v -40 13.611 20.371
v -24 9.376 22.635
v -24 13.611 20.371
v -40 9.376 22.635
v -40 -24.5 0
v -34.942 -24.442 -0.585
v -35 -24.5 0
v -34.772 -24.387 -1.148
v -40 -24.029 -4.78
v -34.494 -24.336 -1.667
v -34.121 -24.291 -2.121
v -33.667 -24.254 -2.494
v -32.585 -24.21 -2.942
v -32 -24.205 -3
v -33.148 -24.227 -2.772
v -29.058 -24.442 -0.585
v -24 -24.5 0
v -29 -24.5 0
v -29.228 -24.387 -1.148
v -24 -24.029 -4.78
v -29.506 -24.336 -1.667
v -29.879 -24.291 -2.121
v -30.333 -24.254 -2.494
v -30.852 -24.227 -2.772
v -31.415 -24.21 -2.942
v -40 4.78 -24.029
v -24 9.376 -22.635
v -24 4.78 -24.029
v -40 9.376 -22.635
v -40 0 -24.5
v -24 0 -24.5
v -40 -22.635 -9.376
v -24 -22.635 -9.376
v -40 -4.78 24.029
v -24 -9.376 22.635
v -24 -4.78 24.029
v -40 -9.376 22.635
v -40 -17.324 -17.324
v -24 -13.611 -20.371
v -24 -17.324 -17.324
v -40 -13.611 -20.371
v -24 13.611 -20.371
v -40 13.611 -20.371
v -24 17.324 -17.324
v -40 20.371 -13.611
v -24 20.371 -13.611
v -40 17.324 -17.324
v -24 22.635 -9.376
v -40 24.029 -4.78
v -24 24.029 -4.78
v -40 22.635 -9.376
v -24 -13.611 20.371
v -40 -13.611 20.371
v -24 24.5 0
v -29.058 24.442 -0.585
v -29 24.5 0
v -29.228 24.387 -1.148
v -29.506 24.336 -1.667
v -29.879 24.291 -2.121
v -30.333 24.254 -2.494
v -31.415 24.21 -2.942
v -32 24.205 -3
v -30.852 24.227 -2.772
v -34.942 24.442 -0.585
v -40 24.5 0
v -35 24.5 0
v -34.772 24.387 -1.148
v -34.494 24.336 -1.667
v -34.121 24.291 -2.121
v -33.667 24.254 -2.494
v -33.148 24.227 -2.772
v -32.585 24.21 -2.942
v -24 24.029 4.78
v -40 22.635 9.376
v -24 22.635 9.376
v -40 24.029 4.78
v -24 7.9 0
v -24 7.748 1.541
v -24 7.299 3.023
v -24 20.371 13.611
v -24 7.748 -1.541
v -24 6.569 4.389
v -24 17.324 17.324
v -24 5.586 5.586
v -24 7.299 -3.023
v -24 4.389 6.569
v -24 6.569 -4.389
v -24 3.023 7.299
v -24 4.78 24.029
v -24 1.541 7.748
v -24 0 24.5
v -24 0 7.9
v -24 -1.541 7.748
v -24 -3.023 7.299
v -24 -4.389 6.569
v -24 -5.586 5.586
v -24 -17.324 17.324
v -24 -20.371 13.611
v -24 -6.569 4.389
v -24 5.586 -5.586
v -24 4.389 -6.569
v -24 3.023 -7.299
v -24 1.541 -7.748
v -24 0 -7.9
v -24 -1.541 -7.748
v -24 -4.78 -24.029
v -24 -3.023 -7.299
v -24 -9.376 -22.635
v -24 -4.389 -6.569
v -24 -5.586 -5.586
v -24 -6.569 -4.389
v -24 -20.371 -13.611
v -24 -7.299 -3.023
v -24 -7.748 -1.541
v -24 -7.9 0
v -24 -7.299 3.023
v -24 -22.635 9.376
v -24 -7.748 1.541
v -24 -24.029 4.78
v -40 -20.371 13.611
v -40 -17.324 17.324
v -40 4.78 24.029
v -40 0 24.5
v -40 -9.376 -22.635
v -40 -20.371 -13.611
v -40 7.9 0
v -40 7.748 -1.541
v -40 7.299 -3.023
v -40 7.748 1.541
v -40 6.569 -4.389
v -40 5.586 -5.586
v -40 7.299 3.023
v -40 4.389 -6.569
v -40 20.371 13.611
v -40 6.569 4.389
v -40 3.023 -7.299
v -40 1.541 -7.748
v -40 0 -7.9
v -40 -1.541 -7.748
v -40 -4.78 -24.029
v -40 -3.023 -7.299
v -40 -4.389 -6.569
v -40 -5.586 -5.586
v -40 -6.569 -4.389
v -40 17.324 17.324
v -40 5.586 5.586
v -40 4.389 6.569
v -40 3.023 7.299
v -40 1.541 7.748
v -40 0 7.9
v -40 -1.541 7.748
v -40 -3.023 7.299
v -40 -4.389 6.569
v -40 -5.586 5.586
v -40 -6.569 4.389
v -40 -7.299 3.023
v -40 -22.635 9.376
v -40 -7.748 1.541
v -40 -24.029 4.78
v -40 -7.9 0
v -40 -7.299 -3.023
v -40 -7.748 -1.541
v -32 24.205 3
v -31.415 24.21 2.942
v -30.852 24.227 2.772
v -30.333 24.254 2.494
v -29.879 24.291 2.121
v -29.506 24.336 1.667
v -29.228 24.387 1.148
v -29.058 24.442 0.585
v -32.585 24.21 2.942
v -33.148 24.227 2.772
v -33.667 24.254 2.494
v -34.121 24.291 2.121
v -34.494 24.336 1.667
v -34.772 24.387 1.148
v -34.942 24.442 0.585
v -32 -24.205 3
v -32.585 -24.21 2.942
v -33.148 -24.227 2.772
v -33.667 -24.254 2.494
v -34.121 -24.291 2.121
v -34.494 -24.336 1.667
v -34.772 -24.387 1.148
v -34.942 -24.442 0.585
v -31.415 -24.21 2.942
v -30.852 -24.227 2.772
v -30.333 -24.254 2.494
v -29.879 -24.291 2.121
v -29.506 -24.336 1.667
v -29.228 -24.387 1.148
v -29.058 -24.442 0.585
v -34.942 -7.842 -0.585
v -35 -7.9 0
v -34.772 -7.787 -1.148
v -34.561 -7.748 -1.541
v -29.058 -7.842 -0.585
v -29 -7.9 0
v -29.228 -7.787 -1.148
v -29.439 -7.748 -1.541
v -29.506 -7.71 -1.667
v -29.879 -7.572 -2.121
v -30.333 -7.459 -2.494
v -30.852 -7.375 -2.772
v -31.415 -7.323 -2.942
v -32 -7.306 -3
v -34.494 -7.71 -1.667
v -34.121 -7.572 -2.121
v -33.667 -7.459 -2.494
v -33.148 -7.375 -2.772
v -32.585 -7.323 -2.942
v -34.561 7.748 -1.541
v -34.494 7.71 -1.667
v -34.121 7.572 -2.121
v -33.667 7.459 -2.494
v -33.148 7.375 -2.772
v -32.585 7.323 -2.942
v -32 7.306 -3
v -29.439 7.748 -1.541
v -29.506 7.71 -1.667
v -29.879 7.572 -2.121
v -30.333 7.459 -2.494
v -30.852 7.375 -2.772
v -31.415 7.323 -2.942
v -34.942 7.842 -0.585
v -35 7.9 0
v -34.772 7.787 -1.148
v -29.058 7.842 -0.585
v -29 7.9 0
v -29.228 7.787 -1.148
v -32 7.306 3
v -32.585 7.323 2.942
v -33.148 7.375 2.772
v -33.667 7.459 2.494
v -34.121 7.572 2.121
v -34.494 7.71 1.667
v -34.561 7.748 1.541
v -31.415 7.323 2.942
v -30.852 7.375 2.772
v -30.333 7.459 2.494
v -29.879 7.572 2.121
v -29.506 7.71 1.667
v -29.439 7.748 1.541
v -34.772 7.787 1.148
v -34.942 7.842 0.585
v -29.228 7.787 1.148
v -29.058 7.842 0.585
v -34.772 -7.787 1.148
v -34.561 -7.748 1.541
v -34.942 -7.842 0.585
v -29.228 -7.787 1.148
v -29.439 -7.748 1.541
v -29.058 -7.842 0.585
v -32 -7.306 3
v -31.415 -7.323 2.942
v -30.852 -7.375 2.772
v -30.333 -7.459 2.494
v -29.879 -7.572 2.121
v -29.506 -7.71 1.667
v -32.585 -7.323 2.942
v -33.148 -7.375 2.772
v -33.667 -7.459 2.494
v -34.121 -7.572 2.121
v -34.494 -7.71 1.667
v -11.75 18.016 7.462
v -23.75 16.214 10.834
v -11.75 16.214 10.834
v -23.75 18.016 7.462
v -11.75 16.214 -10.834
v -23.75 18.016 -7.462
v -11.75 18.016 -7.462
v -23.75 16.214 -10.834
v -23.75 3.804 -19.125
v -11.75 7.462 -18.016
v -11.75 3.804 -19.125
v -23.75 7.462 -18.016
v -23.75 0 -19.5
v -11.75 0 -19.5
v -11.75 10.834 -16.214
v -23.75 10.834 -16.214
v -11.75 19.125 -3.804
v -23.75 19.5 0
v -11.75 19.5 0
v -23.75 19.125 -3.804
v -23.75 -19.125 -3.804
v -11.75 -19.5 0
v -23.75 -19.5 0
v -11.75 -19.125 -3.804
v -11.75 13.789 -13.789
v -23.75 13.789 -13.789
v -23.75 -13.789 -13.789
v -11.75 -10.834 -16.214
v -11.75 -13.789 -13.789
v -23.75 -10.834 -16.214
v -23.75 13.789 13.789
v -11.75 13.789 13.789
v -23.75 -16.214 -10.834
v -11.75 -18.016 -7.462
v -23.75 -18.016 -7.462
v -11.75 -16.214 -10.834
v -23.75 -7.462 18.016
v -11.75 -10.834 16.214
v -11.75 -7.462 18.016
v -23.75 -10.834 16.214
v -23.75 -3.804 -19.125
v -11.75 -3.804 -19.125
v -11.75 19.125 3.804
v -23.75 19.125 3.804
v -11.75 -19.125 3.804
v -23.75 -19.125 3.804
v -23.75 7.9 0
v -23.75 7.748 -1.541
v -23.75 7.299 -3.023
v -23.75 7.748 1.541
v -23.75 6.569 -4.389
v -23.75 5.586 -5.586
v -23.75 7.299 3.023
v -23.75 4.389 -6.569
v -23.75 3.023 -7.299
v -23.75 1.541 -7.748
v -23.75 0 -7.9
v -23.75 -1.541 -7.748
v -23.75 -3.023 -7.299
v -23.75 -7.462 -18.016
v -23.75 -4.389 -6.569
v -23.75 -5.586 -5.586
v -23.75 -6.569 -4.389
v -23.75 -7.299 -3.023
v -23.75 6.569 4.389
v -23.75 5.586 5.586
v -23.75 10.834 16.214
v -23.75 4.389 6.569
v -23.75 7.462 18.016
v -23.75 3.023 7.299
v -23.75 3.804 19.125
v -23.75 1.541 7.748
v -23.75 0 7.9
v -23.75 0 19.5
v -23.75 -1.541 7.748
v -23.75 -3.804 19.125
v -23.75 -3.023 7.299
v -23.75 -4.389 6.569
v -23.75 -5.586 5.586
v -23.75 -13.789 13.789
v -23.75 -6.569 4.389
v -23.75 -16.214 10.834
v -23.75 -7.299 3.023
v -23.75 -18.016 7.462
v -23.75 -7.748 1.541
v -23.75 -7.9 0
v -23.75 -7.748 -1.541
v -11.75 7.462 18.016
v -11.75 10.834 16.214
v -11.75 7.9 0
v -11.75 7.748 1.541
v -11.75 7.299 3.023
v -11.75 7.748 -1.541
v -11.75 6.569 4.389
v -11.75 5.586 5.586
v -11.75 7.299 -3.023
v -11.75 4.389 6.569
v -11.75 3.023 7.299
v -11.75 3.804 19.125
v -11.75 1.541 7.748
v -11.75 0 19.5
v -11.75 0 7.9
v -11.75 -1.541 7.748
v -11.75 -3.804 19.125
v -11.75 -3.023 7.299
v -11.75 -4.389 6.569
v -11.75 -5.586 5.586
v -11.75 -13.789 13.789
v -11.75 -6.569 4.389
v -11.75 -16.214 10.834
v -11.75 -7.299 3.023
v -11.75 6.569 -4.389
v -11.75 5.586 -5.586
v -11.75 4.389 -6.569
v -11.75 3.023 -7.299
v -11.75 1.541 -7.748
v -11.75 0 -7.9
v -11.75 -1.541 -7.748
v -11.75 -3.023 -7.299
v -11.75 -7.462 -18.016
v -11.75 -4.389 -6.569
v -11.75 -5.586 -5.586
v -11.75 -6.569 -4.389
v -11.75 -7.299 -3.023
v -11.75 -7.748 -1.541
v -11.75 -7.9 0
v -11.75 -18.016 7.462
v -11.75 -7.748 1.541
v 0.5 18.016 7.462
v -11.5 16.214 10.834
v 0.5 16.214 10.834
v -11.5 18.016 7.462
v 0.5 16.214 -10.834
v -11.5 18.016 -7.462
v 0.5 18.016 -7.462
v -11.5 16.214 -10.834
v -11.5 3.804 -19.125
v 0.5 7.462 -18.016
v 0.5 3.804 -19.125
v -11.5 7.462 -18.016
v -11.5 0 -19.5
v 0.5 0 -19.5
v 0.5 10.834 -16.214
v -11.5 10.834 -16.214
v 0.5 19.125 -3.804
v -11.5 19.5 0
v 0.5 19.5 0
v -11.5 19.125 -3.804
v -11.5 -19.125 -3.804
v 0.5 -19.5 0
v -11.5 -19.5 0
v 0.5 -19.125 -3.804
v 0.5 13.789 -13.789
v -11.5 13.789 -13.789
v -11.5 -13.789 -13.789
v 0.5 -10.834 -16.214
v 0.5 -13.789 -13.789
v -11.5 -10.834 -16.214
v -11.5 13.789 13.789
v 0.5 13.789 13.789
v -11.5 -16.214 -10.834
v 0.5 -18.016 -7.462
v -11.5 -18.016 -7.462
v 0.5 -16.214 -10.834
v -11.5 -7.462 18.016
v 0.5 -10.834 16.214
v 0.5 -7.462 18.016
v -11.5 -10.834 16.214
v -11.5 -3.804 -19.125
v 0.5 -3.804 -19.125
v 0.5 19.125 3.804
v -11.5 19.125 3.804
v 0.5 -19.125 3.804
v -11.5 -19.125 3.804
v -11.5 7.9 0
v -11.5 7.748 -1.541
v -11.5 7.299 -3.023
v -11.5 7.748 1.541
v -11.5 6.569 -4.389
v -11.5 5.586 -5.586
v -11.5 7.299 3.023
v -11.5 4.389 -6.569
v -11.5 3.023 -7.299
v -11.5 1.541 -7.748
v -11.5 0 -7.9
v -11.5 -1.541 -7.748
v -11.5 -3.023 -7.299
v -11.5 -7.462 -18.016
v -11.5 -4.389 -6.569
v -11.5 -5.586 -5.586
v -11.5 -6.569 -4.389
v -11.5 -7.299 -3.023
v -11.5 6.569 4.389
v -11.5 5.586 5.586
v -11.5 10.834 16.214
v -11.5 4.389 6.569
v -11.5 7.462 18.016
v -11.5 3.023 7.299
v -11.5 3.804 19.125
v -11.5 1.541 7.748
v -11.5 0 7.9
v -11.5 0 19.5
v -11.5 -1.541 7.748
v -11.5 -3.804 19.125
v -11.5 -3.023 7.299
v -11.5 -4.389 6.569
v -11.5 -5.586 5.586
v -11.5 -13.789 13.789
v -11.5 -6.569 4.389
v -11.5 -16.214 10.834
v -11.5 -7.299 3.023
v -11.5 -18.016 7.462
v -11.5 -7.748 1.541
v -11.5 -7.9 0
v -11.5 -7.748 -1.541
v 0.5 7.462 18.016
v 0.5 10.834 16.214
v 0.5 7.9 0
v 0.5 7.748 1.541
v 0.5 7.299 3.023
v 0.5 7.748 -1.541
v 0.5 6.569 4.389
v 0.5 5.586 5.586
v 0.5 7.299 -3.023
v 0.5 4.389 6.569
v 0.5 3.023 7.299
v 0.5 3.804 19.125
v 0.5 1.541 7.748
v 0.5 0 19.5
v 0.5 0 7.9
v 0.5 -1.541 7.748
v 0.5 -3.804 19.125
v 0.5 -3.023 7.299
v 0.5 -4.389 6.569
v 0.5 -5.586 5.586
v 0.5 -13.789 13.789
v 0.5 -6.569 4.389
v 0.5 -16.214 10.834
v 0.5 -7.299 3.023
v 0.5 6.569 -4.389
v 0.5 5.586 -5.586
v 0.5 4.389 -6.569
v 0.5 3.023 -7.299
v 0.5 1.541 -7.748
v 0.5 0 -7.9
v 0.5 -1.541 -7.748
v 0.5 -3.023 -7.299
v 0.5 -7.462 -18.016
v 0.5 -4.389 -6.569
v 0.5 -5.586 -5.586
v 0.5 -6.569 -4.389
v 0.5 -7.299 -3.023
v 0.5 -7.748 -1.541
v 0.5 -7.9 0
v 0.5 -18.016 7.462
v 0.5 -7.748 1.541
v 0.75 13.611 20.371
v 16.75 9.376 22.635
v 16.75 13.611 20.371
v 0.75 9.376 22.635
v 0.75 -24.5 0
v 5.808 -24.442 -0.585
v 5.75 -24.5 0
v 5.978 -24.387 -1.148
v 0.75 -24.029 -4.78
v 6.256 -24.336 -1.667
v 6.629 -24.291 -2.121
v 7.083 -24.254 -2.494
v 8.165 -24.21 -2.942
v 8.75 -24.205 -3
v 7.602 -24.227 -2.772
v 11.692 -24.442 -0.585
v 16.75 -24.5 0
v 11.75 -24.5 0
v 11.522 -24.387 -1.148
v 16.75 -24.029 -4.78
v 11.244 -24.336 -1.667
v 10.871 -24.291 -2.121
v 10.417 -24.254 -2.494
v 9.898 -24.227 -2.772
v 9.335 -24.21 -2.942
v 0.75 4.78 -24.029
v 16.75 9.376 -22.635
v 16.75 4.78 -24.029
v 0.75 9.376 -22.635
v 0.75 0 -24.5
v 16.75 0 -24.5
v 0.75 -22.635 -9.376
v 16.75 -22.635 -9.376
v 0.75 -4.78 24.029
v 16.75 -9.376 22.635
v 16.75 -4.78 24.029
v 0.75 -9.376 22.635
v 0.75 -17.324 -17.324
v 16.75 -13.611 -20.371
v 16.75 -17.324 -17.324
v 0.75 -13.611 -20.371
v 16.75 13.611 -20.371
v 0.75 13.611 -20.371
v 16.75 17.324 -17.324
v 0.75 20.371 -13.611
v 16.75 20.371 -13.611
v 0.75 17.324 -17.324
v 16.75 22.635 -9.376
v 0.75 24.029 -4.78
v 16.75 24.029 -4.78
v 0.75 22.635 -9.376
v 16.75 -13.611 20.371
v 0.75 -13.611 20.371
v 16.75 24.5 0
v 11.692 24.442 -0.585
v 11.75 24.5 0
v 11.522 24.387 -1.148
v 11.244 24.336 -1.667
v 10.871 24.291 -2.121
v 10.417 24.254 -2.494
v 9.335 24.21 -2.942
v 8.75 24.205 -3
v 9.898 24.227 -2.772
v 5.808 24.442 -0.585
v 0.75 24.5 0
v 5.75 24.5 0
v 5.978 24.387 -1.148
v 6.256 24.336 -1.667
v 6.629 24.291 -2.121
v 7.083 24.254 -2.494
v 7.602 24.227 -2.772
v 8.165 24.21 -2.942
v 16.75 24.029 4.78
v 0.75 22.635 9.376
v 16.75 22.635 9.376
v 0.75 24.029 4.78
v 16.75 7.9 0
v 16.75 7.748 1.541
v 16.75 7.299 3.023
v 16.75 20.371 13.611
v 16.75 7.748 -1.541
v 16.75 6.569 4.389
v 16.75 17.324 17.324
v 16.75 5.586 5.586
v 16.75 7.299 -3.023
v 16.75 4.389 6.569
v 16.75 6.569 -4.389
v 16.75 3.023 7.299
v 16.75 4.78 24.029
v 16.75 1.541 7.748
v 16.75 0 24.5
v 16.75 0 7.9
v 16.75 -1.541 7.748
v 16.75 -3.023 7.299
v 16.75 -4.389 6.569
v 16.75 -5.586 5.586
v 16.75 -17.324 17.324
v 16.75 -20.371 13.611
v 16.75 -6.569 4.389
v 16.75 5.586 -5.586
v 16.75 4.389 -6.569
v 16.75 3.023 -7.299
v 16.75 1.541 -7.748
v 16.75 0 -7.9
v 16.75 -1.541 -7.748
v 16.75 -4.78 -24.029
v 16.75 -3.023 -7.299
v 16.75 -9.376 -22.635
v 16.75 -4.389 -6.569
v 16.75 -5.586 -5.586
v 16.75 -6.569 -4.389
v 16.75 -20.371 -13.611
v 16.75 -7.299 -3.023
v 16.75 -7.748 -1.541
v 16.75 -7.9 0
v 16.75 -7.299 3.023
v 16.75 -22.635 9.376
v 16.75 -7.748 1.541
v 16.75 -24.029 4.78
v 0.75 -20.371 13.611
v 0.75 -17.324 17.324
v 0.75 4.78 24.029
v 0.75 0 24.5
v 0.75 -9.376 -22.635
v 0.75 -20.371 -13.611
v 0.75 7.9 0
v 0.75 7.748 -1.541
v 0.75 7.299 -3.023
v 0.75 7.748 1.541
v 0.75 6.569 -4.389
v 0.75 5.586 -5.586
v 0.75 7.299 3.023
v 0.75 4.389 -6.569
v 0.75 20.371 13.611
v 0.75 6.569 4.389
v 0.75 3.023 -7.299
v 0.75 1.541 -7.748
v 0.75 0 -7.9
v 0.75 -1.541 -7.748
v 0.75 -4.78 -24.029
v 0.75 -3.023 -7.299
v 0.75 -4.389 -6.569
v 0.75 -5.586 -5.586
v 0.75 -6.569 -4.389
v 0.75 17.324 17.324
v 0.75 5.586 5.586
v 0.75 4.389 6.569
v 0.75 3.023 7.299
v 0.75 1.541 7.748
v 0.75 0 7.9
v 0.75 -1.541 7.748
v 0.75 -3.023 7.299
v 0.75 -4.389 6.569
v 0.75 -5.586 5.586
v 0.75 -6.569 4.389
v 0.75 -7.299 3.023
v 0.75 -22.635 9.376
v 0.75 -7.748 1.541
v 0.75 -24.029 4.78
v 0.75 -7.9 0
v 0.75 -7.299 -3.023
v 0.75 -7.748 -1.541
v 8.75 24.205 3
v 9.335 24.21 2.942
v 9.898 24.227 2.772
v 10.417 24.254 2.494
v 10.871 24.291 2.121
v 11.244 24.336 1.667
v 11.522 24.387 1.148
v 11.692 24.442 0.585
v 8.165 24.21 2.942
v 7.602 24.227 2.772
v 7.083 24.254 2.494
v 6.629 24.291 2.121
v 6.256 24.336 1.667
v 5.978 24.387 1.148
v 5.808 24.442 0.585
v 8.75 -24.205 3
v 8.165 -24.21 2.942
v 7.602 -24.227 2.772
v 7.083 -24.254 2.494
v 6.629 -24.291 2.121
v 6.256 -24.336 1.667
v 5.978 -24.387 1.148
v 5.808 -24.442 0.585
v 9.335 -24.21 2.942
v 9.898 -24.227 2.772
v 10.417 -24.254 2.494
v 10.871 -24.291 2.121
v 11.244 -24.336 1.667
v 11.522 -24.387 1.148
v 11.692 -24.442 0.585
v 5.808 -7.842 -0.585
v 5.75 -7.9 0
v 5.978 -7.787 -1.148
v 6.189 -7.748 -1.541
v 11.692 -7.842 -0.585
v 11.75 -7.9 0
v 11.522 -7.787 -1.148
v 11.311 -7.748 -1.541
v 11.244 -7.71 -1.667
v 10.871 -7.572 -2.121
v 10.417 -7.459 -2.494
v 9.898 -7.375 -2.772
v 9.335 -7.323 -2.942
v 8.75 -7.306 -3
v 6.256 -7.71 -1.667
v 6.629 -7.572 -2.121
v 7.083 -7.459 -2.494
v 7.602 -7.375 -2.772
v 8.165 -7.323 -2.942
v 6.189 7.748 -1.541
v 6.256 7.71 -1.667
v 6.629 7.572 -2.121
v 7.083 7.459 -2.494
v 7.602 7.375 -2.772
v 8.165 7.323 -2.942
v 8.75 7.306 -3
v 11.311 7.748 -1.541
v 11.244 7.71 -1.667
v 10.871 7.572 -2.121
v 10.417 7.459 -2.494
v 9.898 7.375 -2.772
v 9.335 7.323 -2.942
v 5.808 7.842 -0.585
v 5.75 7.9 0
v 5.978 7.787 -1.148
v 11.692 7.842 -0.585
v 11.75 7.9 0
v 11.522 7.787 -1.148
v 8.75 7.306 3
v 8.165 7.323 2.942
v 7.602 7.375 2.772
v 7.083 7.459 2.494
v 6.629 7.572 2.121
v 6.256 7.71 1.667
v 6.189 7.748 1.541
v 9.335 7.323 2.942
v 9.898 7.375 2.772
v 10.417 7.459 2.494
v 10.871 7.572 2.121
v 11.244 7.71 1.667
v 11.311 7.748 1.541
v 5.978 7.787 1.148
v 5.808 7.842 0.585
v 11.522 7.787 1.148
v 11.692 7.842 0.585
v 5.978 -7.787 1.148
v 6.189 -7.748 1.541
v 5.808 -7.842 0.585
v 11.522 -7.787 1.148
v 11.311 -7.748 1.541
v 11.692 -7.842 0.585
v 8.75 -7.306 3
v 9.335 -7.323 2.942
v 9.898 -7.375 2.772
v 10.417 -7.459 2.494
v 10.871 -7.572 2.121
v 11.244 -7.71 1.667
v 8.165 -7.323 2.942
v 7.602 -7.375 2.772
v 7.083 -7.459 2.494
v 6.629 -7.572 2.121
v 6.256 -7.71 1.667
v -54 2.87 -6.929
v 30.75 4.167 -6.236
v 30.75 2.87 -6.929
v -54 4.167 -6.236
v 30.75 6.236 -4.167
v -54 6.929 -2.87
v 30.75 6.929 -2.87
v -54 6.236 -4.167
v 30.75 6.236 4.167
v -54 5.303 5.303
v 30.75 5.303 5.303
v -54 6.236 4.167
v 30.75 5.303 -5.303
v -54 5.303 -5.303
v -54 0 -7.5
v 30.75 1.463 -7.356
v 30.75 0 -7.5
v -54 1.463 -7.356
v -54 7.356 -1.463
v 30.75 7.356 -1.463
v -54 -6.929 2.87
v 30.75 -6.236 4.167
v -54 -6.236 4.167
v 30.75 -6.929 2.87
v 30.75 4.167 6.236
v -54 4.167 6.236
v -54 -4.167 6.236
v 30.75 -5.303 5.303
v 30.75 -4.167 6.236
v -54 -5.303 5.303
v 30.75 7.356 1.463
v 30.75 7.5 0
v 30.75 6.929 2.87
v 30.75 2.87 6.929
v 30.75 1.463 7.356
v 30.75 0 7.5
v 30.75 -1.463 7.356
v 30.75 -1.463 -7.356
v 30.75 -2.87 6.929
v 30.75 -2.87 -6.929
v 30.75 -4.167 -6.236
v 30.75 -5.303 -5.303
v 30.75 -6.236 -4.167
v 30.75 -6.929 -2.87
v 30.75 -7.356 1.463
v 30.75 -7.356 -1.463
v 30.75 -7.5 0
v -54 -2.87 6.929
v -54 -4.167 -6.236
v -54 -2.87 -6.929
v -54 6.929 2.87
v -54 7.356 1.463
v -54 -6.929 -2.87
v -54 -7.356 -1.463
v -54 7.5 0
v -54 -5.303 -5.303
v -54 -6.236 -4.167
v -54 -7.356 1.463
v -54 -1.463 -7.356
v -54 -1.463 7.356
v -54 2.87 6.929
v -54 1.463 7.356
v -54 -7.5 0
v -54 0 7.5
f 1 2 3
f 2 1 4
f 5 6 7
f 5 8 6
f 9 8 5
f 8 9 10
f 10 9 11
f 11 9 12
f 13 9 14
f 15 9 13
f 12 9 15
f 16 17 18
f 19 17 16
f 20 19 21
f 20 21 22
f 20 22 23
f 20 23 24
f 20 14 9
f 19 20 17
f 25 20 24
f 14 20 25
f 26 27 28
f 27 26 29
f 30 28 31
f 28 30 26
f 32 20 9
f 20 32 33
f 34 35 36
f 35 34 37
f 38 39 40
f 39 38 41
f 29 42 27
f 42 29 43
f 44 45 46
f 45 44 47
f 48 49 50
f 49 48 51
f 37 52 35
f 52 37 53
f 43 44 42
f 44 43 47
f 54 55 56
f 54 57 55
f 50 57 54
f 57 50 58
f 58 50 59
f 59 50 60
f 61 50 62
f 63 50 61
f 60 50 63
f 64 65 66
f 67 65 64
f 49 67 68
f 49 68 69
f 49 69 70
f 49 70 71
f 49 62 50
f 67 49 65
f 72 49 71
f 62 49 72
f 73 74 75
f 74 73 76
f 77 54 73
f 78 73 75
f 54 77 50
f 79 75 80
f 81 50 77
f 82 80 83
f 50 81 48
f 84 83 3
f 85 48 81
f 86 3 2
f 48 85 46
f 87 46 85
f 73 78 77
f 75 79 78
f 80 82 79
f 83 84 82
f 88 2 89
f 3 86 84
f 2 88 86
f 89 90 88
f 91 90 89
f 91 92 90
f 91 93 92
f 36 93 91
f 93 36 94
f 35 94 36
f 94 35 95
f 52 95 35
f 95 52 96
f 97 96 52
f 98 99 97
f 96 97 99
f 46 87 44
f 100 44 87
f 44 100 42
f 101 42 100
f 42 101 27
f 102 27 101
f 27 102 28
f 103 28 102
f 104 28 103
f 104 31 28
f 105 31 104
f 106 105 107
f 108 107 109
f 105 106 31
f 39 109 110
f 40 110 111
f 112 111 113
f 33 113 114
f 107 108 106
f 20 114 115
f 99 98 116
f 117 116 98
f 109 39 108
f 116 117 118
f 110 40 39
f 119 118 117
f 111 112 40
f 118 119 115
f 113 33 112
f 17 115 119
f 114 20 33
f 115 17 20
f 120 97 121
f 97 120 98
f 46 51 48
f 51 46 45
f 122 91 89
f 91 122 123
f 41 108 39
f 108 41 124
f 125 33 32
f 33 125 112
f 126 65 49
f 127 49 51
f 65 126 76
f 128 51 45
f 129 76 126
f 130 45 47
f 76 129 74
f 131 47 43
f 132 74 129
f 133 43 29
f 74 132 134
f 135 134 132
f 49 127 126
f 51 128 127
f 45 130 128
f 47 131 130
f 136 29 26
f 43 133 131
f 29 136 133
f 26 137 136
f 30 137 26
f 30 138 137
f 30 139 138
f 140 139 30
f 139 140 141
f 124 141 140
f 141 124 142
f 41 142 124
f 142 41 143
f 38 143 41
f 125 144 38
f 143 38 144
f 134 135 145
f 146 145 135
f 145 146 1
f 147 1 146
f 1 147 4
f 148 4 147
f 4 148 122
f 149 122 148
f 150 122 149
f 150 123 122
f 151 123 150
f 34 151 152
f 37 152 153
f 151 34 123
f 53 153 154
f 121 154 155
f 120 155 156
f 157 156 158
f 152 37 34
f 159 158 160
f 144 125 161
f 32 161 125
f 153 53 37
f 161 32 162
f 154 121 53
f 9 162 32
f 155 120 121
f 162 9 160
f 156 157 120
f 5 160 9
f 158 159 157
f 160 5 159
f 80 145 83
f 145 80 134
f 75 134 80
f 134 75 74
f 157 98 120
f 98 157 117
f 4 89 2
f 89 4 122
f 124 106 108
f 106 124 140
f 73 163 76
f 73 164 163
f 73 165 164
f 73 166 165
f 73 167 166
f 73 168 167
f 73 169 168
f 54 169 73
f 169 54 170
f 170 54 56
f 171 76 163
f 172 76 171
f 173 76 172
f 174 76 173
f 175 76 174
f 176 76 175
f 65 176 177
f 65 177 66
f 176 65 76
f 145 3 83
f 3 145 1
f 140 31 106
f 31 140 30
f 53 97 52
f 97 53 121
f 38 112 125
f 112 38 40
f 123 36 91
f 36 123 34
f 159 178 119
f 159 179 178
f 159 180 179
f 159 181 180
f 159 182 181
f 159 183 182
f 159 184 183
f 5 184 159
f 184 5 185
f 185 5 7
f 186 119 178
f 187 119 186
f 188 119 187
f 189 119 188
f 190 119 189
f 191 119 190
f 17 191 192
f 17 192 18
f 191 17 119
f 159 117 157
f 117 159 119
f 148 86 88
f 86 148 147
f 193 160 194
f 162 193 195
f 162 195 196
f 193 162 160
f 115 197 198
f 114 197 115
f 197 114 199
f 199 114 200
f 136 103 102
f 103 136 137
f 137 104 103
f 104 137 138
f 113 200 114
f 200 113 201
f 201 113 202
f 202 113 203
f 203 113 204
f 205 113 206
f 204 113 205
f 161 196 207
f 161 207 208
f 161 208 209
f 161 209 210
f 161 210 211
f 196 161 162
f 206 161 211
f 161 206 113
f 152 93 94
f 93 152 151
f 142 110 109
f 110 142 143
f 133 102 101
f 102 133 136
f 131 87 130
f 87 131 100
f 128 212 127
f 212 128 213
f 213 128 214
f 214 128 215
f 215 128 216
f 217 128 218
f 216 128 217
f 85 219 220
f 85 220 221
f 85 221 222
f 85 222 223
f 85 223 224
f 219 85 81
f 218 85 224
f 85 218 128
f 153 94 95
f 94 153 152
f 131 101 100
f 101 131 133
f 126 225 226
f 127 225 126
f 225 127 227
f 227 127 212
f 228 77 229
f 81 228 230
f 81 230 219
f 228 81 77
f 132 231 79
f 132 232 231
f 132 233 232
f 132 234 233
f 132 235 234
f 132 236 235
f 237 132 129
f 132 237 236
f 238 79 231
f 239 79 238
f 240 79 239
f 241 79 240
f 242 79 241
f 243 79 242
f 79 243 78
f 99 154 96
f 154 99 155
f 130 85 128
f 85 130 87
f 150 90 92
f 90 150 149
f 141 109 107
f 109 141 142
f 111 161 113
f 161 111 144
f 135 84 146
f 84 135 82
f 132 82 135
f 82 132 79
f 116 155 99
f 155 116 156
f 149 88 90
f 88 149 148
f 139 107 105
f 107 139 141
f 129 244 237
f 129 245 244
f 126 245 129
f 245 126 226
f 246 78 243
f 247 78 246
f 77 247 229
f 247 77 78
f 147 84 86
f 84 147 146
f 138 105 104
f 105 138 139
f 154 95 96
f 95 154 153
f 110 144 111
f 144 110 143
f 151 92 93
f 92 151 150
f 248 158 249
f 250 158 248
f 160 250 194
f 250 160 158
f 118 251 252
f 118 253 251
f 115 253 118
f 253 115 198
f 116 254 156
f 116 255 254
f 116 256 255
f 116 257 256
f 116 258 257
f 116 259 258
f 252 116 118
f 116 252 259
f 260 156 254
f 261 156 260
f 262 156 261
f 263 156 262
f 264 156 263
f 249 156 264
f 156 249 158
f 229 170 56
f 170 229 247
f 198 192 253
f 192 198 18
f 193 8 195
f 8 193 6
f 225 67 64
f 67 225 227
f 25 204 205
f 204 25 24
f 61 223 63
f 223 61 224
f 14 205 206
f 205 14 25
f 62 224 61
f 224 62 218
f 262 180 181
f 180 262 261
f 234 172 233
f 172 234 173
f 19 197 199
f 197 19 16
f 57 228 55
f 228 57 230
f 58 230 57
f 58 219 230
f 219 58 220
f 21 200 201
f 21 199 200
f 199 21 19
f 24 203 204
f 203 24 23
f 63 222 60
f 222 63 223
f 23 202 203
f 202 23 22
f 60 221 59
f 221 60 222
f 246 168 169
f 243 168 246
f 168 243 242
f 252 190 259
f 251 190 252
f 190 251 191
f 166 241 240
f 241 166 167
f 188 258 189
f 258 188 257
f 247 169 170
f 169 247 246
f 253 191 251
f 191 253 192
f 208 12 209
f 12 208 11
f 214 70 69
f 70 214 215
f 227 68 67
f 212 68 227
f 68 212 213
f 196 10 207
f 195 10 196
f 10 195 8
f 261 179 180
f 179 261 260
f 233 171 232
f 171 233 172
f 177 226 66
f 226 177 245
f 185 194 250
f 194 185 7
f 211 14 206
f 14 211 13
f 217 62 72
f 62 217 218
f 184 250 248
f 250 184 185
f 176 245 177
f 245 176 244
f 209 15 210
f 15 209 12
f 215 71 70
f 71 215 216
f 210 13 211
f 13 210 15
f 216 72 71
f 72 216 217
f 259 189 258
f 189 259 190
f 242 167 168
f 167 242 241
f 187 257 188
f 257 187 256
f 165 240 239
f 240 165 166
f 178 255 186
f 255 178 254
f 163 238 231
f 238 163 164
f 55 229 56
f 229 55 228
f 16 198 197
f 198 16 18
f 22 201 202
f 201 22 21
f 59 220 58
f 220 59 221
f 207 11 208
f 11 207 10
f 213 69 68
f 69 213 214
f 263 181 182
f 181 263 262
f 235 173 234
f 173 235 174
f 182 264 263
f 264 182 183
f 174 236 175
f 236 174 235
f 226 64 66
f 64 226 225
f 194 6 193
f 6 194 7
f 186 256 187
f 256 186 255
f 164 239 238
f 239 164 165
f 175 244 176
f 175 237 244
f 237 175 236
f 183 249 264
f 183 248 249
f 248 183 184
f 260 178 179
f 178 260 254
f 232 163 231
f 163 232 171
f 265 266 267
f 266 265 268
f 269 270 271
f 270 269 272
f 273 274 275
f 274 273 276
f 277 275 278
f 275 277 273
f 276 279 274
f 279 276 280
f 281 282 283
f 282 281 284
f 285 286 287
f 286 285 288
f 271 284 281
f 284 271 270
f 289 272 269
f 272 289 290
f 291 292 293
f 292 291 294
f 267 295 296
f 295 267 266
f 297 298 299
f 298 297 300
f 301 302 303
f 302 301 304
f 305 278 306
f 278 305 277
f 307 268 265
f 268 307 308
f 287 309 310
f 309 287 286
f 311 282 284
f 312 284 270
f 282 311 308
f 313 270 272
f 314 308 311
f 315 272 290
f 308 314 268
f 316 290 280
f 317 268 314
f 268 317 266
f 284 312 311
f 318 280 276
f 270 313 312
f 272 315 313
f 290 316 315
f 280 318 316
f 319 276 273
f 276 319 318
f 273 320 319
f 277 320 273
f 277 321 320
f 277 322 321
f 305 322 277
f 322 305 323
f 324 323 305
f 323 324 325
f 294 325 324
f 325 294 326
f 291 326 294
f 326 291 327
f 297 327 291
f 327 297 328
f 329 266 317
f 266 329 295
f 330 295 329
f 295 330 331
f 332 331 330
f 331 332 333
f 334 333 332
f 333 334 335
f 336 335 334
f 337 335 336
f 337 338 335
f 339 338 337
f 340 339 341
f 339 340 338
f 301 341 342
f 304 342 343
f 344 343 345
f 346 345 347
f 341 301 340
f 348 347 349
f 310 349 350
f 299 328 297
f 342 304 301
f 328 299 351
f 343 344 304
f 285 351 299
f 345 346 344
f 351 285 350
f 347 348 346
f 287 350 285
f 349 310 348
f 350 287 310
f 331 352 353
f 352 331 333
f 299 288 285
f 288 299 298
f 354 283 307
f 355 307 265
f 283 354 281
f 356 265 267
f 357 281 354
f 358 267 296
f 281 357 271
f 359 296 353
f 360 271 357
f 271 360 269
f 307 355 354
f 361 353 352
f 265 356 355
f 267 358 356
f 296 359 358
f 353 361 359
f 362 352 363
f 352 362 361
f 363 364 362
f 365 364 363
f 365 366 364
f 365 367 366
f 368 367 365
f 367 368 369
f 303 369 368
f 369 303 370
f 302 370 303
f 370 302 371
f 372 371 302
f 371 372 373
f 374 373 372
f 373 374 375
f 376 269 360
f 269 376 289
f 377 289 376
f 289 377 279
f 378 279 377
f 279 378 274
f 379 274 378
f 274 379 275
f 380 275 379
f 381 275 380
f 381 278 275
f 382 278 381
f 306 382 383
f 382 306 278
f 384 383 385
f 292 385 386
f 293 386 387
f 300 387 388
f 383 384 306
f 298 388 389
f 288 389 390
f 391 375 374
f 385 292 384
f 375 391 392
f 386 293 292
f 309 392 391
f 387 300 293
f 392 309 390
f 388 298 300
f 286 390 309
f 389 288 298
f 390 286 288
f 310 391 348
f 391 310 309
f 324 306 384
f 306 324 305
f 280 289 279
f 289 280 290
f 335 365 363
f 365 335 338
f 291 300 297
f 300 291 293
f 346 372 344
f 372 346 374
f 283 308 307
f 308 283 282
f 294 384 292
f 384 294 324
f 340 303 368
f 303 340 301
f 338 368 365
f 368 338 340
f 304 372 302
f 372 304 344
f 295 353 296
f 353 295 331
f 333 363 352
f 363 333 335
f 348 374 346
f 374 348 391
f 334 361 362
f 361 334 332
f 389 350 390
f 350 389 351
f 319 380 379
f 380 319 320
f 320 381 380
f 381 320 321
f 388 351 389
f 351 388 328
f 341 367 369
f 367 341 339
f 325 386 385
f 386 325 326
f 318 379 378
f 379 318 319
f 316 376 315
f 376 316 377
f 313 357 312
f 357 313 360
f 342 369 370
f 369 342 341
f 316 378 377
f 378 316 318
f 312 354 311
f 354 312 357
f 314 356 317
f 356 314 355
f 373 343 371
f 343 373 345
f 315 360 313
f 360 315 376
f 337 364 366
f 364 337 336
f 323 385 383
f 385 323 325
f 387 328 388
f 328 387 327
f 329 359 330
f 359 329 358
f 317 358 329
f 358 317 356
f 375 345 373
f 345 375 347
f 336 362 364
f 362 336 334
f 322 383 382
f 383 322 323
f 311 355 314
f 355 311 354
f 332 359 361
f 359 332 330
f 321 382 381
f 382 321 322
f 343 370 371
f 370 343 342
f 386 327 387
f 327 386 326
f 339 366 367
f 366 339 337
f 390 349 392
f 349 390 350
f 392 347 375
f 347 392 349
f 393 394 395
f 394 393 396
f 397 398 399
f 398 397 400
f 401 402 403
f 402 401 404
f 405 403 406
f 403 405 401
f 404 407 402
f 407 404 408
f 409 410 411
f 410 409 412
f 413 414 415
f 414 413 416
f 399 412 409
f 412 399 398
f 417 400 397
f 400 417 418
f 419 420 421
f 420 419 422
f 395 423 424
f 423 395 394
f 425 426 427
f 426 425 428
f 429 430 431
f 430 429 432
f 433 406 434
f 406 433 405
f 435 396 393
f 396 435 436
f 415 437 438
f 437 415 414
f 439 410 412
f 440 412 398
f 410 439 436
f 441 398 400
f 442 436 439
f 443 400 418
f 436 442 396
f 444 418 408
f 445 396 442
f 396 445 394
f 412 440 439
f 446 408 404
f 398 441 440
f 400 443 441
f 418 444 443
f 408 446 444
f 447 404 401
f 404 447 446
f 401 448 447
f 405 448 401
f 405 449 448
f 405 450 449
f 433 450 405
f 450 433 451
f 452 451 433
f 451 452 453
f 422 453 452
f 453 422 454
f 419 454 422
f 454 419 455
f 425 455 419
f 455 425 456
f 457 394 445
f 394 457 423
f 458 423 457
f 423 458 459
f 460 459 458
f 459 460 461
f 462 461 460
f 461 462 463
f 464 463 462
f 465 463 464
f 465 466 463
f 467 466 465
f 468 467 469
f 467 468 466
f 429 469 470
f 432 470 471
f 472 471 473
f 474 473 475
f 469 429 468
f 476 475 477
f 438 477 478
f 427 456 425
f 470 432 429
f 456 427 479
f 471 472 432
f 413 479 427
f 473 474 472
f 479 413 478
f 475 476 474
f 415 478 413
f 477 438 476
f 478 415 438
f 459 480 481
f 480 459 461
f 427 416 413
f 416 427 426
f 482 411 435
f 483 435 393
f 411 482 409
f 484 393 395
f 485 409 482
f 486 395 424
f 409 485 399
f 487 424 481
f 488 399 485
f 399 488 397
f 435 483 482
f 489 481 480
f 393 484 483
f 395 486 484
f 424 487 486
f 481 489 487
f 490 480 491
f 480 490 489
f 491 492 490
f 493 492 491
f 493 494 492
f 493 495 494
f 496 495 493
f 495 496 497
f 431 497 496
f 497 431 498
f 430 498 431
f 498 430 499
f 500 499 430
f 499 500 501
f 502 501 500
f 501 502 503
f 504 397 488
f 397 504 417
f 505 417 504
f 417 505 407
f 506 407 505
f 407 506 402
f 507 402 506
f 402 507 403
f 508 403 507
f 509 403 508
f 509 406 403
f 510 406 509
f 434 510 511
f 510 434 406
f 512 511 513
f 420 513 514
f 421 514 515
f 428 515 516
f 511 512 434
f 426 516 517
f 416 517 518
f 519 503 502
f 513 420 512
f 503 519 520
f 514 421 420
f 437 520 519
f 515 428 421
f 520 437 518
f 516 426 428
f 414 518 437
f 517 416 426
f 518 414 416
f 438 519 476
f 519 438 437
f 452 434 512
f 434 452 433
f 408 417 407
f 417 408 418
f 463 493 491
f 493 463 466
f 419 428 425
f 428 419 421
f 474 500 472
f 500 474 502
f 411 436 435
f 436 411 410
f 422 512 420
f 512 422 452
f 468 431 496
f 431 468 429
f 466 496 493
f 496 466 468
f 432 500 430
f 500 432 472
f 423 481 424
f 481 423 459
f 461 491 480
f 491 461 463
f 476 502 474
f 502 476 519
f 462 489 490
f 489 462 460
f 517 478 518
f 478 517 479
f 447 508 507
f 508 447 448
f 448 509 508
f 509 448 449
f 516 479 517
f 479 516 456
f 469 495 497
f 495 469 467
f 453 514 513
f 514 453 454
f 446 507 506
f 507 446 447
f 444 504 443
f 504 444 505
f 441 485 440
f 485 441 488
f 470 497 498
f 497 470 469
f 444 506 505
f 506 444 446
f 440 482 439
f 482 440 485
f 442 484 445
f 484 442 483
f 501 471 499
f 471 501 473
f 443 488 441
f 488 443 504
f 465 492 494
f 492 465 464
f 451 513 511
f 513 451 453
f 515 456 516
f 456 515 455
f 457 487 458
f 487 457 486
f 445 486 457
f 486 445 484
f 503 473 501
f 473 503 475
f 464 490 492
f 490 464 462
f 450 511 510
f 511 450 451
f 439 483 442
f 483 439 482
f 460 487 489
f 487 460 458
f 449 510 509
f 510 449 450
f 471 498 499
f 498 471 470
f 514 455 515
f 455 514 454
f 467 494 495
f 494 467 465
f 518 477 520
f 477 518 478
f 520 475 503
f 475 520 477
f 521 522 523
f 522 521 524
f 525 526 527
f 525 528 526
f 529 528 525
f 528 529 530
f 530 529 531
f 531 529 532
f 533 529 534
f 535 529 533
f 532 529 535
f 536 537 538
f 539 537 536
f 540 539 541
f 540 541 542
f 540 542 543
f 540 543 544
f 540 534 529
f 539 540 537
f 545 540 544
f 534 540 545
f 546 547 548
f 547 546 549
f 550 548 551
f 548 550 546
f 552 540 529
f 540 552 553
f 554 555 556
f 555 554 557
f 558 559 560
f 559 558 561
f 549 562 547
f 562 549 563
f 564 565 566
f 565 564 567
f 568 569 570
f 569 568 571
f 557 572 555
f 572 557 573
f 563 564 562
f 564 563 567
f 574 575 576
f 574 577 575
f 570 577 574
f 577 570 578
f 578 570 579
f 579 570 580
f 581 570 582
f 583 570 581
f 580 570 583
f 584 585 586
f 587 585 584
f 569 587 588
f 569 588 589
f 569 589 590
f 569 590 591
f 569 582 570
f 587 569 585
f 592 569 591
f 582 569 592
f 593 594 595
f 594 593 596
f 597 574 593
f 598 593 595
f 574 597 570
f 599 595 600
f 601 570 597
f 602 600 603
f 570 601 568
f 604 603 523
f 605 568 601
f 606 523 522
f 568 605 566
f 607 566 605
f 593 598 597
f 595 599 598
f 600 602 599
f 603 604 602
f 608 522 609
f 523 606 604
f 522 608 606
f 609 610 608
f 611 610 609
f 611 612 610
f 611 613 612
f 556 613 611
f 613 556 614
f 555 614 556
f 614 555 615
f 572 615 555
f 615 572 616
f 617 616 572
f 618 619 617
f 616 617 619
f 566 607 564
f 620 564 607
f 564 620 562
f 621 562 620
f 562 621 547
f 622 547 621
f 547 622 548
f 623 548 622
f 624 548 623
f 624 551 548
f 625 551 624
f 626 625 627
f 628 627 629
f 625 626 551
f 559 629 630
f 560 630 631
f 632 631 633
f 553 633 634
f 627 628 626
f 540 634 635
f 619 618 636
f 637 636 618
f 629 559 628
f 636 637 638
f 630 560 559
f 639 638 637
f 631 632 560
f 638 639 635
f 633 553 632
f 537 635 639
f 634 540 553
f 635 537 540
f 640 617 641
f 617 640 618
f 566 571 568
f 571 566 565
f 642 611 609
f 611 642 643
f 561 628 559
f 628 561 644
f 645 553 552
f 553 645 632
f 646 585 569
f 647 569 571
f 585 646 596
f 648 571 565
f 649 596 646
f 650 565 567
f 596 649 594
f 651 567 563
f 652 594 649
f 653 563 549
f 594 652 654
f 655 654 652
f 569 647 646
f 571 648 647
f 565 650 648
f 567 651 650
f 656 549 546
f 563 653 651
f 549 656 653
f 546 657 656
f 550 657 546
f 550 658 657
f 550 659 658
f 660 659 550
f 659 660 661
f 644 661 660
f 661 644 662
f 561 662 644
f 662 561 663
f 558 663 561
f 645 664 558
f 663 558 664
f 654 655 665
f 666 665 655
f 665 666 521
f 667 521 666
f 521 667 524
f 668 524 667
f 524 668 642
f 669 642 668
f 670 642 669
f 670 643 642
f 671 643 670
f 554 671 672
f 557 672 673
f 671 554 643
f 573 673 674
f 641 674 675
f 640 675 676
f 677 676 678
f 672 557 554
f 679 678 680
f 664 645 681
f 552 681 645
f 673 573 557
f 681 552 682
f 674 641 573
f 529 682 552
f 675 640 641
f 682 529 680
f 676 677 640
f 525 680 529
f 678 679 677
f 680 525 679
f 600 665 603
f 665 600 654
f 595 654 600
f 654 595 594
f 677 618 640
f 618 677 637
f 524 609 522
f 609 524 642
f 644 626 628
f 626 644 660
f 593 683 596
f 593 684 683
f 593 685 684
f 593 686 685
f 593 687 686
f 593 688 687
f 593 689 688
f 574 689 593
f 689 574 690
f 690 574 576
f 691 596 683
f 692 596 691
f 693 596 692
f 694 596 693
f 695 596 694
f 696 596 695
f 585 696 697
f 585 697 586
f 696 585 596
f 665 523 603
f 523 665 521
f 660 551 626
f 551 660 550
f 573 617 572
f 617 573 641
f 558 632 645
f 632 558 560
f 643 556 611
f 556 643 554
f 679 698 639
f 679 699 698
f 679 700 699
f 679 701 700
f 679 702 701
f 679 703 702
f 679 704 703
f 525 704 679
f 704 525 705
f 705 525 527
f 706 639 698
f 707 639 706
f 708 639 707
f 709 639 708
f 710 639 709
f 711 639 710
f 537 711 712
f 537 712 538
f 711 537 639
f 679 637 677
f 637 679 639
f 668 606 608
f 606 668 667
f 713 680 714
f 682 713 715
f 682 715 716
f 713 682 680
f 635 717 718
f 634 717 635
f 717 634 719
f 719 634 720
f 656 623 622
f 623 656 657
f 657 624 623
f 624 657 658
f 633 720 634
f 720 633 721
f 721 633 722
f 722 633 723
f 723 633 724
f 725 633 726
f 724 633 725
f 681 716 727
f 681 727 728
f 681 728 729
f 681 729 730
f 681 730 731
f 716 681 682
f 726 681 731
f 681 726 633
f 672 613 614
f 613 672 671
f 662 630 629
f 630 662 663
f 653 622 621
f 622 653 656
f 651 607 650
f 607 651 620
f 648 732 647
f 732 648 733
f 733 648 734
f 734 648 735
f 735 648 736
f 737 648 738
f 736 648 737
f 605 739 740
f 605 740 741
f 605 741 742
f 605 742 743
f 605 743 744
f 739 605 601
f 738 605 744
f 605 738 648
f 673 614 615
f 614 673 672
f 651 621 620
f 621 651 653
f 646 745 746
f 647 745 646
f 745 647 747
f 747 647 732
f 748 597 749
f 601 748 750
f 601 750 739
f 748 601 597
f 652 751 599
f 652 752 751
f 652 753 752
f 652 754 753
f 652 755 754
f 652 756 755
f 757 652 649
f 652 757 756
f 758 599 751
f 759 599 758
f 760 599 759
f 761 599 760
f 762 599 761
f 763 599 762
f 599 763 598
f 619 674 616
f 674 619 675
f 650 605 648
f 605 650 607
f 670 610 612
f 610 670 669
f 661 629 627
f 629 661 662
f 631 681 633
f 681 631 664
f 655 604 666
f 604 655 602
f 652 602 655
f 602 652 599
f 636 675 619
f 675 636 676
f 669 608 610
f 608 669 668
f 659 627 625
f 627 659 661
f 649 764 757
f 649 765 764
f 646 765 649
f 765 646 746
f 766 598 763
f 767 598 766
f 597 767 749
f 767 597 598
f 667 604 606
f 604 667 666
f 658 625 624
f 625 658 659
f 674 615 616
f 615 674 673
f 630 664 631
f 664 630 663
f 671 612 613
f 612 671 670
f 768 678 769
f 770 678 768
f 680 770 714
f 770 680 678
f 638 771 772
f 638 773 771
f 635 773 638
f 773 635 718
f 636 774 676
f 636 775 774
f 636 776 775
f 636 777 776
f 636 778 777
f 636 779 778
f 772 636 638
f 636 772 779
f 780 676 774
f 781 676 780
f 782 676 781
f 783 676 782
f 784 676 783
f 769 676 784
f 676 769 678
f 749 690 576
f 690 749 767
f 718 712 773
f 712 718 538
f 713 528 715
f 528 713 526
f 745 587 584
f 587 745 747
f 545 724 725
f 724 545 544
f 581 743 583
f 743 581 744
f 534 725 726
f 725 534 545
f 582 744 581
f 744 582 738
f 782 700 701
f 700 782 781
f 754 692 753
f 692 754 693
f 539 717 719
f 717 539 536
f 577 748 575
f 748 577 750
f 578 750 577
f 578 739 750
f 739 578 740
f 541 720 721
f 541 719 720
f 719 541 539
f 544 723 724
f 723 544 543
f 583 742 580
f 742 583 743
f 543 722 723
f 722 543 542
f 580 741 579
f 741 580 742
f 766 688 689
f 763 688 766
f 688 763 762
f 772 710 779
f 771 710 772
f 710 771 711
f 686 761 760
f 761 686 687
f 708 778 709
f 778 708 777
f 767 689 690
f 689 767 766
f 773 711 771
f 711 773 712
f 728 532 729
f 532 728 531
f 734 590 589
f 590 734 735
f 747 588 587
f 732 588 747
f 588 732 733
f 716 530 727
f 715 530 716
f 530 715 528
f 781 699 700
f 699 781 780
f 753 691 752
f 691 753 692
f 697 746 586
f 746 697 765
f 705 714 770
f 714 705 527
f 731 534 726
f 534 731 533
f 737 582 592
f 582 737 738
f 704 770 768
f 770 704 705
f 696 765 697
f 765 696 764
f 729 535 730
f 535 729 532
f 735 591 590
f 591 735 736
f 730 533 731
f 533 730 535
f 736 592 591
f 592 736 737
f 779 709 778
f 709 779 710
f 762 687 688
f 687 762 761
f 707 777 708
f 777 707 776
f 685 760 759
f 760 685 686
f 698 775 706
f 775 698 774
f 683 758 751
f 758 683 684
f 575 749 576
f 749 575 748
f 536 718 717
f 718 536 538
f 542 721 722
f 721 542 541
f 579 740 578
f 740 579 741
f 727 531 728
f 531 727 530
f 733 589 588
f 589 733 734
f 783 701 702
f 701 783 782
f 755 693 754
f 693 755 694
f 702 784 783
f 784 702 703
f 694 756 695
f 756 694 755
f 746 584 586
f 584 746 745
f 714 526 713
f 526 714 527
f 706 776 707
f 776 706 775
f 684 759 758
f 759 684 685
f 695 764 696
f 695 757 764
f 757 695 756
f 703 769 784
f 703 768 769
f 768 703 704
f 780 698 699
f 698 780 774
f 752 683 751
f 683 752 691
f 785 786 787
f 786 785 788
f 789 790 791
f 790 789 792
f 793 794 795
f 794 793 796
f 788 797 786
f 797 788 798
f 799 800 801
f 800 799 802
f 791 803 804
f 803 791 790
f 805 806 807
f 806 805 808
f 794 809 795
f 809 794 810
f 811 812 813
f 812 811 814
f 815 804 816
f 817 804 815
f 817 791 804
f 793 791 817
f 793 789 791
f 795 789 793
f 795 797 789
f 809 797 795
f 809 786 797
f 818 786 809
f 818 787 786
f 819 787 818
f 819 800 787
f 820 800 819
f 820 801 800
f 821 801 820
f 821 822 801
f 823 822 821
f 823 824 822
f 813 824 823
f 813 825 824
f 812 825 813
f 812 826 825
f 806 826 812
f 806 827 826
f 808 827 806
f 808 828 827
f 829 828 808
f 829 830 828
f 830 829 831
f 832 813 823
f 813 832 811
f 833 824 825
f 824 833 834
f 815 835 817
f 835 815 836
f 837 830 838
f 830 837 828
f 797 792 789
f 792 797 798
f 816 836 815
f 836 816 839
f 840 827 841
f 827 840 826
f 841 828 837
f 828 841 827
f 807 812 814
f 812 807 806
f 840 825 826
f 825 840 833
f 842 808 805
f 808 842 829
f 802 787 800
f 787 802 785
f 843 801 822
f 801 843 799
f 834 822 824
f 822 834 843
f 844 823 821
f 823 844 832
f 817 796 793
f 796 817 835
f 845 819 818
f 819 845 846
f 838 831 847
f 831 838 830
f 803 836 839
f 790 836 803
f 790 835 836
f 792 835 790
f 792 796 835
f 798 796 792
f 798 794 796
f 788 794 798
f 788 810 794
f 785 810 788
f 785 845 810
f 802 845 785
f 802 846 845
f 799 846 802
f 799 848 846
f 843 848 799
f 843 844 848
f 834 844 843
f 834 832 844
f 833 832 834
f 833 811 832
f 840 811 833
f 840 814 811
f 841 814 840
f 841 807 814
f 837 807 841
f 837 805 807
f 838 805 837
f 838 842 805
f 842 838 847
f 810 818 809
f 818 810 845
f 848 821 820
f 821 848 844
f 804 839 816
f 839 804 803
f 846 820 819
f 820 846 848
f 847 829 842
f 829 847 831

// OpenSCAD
$fn = 32;

// ------------------------------------------------------------------------
// Shaft with rings and collars: d15 shaft, 4 rings
// Every part is its own module, assembly() places them once.
// ------------------------------------------------------------------------

// --- part 1 ---
module shaft() {
  translate([0, 0, -42.375]) cylinder(h = 84.75, d = 15);
}

// --- part 2 ---
module collar_a() {
  difference() {
    cylinder(h = 16, d = 49);
    translate([0, 0, -1]) cylinder(h = 18, d = 15.8);
    translate([0, 0, 8]) rotate([90, 0, 0]) cylinder(h = 51, d = 6, center = true);
  }
}

// --- part 3 ---
module spacer_a() {
  difference() {
      translate([0, 0, 0]) cylinder(h = 12, d = 39);
      translate([0, 0, -1]) cylinder(h = 14, d = 15.8);
    }
}

// --- part 4 ---
module spacer_b() {
  difference() {
      translate([0, 0, 0]) cylinder(h = 12, d = 39);
      translate([0, 0, -1]) cylinder(h = 14, d = 15.8);
    }
}

// --- part 5 ---
module collar_b() {
  difference() {
    cylinder(h = 16, d = 49);
    translate([0, 0, -1]) cylinder(h = 18, d = 15.8);
    translate([0, 0, 8]) rotate([90, 0, 0]) cylinder(h = 51, d = 6, center = true);
  }
}

// --- assembly ---
module assembly() {
  translate([-11.625, 0, 0]) rotate([0, 90, 0]) shaft();
  translate([-40, 0, 0]) rotate([0, 90, 0]) collar_a();
  translate([-23.75, 0, 0]) rotate([0, 90, 0]) spacer_a();
  translate([-11.5, 0, 0]) rotate([0, 90, 0]) spacer_b();
  translate([0.75, 0, 0]) rotate([0, 90, 0]) collar_b();
}

assembly();
